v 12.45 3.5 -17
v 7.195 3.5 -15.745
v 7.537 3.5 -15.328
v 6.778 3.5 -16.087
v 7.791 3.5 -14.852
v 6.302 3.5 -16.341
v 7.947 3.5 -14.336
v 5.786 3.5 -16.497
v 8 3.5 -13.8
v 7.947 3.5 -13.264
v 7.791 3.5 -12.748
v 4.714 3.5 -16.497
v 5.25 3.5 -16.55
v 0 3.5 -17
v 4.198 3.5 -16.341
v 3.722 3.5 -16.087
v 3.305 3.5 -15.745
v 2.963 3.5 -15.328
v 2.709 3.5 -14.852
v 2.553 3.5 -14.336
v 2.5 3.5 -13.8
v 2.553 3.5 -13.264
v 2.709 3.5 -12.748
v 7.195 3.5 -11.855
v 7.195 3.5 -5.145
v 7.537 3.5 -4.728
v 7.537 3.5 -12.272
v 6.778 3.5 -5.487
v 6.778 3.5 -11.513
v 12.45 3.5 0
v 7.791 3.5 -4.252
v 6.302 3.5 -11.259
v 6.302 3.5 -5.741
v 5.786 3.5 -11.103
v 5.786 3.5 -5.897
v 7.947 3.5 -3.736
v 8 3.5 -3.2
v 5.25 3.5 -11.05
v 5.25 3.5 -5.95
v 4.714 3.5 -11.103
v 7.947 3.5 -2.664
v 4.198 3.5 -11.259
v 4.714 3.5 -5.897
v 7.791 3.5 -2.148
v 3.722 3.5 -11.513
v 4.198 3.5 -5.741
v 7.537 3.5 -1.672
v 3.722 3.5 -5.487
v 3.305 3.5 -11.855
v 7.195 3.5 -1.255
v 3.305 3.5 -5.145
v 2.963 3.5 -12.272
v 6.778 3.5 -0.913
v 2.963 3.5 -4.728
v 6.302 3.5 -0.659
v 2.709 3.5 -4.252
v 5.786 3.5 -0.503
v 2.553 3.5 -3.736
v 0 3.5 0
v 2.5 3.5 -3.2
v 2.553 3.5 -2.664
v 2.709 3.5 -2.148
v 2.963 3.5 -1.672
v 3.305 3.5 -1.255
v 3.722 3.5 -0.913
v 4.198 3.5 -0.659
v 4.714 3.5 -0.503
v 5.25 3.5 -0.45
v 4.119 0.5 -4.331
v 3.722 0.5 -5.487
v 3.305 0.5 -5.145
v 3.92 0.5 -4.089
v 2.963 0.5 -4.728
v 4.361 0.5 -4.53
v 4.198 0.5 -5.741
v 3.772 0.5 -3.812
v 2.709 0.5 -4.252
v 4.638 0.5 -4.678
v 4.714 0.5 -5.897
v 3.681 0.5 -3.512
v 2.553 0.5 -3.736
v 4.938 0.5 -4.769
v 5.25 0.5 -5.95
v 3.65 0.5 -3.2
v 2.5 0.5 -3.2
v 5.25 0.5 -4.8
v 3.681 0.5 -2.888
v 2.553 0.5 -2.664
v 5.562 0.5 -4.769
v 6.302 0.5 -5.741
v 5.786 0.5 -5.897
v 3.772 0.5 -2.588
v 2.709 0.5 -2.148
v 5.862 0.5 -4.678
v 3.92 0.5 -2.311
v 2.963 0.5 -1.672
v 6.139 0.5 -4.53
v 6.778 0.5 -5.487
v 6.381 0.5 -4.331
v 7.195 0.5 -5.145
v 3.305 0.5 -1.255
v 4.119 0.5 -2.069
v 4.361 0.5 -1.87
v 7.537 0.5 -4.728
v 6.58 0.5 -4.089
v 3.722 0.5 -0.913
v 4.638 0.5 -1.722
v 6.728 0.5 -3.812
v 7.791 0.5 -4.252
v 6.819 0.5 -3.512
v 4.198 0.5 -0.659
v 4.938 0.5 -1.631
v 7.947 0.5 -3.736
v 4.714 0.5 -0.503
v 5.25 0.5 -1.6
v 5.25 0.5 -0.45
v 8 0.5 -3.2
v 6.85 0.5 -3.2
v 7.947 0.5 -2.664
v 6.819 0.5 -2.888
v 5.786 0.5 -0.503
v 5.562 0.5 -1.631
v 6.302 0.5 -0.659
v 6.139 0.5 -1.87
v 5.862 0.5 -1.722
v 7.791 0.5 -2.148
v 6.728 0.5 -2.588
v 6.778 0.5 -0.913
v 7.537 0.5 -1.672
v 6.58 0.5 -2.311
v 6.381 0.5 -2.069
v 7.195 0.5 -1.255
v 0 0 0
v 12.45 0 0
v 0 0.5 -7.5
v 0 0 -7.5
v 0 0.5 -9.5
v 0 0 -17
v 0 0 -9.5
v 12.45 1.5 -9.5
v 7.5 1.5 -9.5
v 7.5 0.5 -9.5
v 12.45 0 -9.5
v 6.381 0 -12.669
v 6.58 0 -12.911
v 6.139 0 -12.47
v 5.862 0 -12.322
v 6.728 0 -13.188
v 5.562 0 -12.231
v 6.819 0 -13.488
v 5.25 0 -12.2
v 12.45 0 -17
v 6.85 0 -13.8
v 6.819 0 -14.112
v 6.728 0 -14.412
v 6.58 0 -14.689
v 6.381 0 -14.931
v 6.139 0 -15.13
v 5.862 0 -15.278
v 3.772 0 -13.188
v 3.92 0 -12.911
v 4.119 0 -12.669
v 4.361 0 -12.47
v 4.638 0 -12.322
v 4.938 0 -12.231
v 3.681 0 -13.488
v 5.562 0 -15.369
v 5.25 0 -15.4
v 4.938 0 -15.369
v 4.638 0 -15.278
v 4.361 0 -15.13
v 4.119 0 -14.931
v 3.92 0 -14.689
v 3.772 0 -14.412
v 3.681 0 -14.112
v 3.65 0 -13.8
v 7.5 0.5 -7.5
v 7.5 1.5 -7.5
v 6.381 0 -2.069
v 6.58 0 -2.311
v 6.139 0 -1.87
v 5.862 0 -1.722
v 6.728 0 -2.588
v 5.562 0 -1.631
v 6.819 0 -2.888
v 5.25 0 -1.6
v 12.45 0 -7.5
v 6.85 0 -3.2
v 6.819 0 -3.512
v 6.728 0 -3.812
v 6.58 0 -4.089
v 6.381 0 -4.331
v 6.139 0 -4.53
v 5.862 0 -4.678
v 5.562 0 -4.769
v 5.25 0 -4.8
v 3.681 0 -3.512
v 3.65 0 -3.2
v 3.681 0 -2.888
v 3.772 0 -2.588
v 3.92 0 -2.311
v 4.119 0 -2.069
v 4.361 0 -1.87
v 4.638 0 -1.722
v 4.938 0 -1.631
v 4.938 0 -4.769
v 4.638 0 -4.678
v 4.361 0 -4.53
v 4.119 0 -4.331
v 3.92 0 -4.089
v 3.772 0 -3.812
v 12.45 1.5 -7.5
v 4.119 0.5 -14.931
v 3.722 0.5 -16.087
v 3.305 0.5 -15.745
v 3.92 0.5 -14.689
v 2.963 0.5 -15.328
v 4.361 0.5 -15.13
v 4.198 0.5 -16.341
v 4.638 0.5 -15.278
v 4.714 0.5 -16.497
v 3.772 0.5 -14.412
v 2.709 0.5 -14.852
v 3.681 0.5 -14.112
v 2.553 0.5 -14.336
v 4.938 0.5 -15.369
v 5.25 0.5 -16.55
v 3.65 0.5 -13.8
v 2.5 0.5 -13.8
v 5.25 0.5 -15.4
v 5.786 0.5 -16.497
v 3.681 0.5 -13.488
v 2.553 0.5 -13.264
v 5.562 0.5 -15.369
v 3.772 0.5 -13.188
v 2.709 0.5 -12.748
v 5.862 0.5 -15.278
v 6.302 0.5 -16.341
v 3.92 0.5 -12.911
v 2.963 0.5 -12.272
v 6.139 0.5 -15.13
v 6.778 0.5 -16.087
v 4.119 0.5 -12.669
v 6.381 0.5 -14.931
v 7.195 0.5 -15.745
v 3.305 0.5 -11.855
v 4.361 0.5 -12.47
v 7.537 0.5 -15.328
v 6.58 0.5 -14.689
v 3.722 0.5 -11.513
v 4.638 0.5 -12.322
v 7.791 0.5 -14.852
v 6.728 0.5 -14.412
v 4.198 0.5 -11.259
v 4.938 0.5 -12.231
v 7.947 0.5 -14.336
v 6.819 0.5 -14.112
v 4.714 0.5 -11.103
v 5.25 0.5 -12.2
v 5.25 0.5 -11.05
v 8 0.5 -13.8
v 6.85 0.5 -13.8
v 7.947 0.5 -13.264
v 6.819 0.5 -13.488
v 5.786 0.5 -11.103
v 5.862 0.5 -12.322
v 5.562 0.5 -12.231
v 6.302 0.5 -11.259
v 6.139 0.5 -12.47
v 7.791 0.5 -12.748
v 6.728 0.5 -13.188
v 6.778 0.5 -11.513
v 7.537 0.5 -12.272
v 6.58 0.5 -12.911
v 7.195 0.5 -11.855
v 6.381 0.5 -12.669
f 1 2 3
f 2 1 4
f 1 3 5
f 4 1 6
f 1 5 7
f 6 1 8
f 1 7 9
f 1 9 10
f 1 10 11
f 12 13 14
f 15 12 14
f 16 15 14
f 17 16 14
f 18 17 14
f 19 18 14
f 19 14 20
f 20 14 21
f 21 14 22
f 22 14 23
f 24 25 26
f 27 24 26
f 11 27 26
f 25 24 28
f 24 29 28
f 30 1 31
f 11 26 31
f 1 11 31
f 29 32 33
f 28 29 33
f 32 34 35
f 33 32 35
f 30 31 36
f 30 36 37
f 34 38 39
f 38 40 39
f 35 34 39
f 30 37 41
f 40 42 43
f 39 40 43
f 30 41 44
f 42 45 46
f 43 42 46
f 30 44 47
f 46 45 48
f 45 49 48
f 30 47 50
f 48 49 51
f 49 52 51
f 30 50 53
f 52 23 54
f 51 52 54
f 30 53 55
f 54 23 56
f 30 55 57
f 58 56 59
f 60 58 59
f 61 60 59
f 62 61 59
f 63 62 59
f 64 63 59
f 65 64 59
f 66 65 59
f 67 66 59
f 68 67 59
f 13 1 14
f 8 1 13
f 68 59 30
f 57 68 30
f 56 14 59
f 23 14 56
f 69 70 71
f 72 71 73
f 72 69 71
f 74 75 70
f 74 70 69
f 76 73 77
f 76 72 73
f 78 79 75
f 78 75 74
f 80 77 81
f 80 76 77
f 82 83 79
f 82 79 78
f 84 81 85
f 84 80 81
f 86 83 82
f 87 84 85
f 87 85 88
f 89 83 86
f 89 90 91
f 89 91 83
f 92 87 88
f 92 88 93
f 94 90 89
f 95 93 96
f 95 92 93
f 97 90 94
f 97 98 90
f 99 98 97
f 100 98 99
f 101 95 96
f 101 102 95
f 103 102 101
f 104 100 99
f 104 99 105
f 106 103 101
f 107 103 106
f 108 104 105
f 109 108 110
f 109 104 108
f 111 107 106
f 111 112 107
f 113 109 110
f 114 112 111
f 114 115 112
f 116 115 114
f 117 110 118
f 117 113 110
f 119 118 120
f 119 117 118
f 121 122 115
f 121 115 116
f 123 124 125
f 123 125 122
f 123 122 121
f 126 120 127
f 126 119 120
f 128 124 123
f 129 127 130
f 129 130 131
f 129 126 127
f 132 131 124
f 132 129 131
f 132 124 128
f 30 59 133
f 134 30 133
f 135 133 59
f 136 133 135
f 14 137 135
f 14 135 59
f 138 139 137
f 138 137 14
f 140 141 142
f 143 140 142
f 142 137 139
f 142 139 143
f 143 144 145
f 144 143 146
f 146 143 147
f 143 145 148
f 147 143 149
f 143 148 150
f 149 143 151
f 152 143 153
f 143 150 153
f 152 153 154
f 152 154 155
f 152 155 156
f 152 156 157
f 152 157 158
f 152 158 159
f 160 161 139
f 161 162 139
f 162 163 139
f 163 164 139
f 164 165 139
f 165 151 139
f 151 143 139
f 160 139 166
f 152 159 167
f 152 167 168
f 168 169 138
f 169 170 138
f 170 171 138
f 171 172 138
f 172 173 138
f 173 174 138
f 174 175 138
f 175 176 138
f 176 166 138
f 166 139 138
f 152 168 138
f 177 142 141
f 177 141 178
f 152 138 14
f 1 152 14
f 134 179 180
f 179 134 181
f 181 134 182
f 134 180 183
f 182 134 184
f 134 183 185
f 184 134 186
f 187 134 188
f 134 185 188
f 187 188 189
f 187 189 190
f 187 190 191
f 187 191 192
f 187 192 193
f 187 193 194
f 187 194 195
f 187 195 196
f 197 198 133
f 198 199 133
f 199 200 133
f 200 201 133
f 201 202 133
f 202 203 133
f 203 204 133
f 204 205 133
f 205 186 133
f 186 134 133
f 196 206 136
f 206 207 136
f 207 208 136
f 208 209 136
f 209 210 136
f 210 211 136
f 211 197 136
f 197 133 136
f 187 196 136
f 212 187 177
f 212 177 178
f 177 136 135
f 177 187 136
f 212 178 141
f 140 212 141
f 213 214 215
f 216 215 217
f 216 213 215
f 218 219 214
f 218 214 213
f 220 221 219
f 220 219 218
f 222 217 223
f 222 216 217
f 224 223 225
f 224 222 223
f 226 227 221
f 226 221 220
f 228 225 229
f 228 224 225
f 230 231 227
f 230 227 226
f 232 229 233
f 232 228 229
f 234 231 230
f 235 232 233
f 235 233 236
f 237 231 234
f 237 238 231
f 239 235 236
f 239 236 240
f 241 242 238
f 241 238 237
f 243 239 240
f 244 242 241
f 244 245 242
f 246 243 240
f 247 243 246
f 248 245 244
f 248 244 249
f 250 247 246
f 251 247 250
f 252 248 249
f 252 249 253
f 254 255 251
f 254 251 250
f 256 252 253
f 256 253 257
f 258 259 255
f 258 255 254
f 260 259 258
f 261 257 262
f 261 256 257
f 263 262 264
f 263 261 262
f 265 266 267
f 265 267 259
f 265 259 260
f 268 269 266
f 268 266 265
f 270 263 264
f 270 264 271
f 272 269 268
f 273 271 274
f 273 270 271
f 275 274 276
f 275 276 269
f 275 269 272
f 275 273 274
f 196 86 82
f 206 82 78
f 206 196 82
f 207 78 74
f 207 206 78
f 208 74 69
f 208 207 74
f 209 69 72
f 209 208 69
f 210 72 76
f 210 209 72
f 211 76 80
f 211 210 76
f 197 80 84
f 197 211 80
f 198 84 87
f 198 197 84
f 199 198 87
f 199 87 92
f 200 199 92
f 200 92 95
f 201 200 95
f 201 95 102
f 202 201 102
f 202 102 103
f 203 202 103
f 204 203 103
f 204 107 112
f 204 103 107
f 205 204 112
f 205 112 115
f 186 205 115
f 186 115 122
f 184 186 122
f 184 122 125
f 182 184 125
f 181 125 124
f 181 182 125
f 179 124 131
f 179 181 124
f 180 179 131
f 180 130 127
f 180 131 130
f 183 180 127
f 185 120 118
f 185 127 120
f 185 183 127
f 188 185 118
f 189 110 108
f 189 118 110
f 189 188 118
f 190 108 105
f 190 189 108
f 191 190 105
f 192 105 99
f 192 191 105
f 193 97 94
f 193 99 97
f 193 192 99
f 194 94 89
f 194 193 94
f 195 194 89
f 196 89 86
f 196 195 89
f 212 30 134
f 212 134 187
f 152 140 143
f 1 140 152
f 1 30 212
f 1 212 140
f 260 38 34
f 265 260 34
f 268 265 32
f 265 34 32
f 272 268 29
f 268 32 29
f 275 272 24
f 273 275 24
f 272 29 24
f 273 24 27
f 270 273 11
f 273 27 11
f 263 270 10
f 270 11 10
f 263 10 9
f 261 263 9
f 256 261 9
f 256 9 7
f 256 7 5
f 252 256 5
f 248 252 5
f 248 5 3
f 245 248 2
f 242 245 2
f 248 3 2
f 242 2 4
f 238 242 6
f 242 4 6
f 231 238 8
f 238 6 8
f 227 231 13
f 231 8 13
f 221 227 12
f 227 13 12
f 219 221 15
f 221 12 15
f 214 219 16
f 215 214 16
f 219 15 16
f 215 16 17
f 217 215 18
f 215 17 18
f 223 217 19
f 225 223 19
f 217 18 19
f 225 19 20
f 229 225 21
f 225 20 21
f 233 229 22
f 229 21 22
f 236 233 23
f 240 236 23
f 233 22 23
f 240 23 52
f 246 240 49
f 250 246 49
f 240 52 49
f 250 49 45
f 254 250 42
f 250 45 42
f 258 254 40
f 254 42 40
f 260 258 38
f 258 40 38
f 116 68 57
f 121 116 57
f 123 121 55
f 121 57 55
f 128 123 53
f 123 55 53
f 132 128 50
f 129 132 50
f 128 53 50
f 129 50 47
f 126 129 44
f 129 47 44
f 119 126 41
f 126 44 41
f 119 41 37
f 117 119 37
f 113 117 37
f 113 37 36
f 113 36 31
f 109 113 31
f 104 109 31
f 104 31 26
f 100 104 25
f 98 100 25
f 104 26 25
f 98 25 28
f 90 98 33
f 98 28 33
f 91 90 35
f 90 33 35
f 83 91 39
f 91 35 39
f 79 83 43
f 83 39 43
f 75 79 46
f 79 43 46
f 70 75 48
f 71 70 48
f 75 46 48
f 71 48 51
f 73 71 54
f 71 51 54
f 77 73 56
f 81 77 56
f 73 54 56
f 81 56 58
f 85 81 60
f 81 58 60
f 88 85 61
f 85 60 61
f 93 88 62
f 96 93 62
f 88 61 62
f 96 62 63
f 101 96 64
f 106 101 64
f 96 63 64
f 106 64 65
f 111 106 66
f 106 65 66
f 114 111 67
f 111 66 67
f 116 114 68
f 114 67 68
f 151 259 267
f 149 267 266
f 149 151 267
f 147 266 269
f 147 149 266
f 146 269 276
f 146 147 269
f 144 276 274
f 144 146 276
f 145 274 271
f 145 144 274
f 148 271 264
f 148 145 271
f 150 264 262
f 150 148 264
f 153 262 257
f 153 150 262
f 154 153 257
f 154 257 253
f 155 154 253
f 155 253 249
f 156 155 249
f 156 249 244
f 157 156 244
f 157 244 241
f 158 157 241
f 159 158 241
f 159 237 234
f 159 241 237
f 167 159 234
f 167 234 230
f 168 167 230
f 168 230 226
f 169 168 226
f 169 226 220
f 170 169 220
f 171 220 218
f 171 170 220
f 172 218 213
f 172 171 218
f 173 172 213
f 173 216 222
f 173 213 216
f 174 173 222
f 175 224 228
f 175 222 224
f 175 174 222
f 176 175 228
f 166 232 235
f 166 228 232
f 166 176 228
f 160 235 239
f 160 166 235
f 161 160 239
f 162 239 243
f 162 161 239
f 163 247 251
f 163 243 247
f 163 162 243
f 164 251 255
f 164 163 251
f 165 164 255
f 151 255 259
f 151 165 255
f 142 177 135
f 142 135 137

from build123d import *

# Parameters (mm, degrees)
CROQUIS1_W              = 10.5
CROQUIS1_H              = 17
CROQUIS1_R              = 1.6
SALIENTE_EXTRUIR1_DEPTH = 3.5
CROQUIS2_R              = 2.75
CORTAR_EXTRUIR1_DEPTH   = 3
CROQUIS3_W              = 2
CROQUIS3_H              = 0.5
CORTAR_EXTRUIR2_DEPTH   = 16
CROQUIS4_W              = 3
CROQUIS4_H              = 2
CORTAR_EXTRUIR3_DEPTH   = 1
SALIENTE_EXTRUIR2_DEPTH = 10
CROQUIS6_W              = 8.05
CROQUIS6_H              = 17
CORTAR_EXTRUIR4_DEPTH   = 10


with BuildPart() as part:
    # Croquis1 → Saliente-Extruir1 (new body)
    with BuildSketch(Plane(origin=(0, 0, 0), x_dir=(1, 0, 0), z_dir=(0, 1, 0))):
        with Locations((5.25, 8.5)):
            Rectangle(CROQUIS1_W, CROQUIS1_H)
        with Locations(Location((5.25, 13.8, 0), (0, 0, 270))):
            Circle(CROQUIS1_R, mode=Mode.SUBTRACT)
        with Locations(Location((5.25, 3.2, 0), (0, 0, 90))):
            Circle(CROQUIS1_R, mode=Mode.SUBTRACT)
    extrude(amount=SALIENTE_EXTRUIR1_DEPTH)

    # Croquis2 → Cortar-Extruir1 (cut)
    with BuildSketch(Plane(origin=(0, 3.5, 0), x_dir=(1, 0, 0), z_dir=(0, 1, 0))):
        with Locations(Location((5.25, 13.8, 0), (0, 0, 270))):
            Circle(CROQUIS2_R)
        with Locations(Location((5.25, 3.2, 0), (0, 0, 270))):
            Circle(CROQUIS2_R)
    extrude(amount=-CORTAR_EXTRUIR1_DEPTH, mode=Mode.SUBTRACT)

    # Croquis3 → Cortar-Extruir2 (cut)
    with BuildSketch(Plane(origin=(10.5, 0, 0), x_dir=(0, 0, -1), z_dir=(1, 0, 0))):
        with Locations((8.5, 0.25)):
            Rectangle(CROQUIS3_W, CROQUIS3_H)
    extrude(amount=-CORTAR_EXTRUIR2_DEPTH, mode=Mode.SUBTRACT)

    # Croquis4 → Cortar-Extruir3 (cut)
    with BuildSketch(Plane.XZ.offset(-0.5)):
        with Locations((9, -8.5)):
            Rectangle(CROQUIS4_W, CROQUIS4_H)
    extrude(amount=-CORTAR_EXTRUIR3_DEPTH, mode=Mode.SUBTRACT)

    # Croquis5 → Saliente-Extruir2 (add)
    with BuildSketch(Plane(origin=(10.5, 0, 0), x_dir=(0, 0, -1), z_dir=(1, 0, 0))):
        Polygon((7.5, 1.5), (9.5, 1.5), (9.5, 0), (17, 0), (17, 3.5), (0, 3.5), (0, 0), (7.5, 0), align=None)
    extrude(amount=SALIENTE_EXTRUIR2_DEPTH)

    # Croquis6 → Cortar-Extruir4 (cut)
    with BuildSketch(Plane(origin=(0, 3.5, 0), x_dir=(1, 0, 0), z_dir=(0, 1, 0))):
        with Locations((16.475, 8.5)):
            Rectangle(CROQUIS6_W, CROQUIS6_H)
    extrude(amount=-CORTAR_EXTRUIR4_DEPTH, mode=Mode.SUBTRACT)


solid = part.part
